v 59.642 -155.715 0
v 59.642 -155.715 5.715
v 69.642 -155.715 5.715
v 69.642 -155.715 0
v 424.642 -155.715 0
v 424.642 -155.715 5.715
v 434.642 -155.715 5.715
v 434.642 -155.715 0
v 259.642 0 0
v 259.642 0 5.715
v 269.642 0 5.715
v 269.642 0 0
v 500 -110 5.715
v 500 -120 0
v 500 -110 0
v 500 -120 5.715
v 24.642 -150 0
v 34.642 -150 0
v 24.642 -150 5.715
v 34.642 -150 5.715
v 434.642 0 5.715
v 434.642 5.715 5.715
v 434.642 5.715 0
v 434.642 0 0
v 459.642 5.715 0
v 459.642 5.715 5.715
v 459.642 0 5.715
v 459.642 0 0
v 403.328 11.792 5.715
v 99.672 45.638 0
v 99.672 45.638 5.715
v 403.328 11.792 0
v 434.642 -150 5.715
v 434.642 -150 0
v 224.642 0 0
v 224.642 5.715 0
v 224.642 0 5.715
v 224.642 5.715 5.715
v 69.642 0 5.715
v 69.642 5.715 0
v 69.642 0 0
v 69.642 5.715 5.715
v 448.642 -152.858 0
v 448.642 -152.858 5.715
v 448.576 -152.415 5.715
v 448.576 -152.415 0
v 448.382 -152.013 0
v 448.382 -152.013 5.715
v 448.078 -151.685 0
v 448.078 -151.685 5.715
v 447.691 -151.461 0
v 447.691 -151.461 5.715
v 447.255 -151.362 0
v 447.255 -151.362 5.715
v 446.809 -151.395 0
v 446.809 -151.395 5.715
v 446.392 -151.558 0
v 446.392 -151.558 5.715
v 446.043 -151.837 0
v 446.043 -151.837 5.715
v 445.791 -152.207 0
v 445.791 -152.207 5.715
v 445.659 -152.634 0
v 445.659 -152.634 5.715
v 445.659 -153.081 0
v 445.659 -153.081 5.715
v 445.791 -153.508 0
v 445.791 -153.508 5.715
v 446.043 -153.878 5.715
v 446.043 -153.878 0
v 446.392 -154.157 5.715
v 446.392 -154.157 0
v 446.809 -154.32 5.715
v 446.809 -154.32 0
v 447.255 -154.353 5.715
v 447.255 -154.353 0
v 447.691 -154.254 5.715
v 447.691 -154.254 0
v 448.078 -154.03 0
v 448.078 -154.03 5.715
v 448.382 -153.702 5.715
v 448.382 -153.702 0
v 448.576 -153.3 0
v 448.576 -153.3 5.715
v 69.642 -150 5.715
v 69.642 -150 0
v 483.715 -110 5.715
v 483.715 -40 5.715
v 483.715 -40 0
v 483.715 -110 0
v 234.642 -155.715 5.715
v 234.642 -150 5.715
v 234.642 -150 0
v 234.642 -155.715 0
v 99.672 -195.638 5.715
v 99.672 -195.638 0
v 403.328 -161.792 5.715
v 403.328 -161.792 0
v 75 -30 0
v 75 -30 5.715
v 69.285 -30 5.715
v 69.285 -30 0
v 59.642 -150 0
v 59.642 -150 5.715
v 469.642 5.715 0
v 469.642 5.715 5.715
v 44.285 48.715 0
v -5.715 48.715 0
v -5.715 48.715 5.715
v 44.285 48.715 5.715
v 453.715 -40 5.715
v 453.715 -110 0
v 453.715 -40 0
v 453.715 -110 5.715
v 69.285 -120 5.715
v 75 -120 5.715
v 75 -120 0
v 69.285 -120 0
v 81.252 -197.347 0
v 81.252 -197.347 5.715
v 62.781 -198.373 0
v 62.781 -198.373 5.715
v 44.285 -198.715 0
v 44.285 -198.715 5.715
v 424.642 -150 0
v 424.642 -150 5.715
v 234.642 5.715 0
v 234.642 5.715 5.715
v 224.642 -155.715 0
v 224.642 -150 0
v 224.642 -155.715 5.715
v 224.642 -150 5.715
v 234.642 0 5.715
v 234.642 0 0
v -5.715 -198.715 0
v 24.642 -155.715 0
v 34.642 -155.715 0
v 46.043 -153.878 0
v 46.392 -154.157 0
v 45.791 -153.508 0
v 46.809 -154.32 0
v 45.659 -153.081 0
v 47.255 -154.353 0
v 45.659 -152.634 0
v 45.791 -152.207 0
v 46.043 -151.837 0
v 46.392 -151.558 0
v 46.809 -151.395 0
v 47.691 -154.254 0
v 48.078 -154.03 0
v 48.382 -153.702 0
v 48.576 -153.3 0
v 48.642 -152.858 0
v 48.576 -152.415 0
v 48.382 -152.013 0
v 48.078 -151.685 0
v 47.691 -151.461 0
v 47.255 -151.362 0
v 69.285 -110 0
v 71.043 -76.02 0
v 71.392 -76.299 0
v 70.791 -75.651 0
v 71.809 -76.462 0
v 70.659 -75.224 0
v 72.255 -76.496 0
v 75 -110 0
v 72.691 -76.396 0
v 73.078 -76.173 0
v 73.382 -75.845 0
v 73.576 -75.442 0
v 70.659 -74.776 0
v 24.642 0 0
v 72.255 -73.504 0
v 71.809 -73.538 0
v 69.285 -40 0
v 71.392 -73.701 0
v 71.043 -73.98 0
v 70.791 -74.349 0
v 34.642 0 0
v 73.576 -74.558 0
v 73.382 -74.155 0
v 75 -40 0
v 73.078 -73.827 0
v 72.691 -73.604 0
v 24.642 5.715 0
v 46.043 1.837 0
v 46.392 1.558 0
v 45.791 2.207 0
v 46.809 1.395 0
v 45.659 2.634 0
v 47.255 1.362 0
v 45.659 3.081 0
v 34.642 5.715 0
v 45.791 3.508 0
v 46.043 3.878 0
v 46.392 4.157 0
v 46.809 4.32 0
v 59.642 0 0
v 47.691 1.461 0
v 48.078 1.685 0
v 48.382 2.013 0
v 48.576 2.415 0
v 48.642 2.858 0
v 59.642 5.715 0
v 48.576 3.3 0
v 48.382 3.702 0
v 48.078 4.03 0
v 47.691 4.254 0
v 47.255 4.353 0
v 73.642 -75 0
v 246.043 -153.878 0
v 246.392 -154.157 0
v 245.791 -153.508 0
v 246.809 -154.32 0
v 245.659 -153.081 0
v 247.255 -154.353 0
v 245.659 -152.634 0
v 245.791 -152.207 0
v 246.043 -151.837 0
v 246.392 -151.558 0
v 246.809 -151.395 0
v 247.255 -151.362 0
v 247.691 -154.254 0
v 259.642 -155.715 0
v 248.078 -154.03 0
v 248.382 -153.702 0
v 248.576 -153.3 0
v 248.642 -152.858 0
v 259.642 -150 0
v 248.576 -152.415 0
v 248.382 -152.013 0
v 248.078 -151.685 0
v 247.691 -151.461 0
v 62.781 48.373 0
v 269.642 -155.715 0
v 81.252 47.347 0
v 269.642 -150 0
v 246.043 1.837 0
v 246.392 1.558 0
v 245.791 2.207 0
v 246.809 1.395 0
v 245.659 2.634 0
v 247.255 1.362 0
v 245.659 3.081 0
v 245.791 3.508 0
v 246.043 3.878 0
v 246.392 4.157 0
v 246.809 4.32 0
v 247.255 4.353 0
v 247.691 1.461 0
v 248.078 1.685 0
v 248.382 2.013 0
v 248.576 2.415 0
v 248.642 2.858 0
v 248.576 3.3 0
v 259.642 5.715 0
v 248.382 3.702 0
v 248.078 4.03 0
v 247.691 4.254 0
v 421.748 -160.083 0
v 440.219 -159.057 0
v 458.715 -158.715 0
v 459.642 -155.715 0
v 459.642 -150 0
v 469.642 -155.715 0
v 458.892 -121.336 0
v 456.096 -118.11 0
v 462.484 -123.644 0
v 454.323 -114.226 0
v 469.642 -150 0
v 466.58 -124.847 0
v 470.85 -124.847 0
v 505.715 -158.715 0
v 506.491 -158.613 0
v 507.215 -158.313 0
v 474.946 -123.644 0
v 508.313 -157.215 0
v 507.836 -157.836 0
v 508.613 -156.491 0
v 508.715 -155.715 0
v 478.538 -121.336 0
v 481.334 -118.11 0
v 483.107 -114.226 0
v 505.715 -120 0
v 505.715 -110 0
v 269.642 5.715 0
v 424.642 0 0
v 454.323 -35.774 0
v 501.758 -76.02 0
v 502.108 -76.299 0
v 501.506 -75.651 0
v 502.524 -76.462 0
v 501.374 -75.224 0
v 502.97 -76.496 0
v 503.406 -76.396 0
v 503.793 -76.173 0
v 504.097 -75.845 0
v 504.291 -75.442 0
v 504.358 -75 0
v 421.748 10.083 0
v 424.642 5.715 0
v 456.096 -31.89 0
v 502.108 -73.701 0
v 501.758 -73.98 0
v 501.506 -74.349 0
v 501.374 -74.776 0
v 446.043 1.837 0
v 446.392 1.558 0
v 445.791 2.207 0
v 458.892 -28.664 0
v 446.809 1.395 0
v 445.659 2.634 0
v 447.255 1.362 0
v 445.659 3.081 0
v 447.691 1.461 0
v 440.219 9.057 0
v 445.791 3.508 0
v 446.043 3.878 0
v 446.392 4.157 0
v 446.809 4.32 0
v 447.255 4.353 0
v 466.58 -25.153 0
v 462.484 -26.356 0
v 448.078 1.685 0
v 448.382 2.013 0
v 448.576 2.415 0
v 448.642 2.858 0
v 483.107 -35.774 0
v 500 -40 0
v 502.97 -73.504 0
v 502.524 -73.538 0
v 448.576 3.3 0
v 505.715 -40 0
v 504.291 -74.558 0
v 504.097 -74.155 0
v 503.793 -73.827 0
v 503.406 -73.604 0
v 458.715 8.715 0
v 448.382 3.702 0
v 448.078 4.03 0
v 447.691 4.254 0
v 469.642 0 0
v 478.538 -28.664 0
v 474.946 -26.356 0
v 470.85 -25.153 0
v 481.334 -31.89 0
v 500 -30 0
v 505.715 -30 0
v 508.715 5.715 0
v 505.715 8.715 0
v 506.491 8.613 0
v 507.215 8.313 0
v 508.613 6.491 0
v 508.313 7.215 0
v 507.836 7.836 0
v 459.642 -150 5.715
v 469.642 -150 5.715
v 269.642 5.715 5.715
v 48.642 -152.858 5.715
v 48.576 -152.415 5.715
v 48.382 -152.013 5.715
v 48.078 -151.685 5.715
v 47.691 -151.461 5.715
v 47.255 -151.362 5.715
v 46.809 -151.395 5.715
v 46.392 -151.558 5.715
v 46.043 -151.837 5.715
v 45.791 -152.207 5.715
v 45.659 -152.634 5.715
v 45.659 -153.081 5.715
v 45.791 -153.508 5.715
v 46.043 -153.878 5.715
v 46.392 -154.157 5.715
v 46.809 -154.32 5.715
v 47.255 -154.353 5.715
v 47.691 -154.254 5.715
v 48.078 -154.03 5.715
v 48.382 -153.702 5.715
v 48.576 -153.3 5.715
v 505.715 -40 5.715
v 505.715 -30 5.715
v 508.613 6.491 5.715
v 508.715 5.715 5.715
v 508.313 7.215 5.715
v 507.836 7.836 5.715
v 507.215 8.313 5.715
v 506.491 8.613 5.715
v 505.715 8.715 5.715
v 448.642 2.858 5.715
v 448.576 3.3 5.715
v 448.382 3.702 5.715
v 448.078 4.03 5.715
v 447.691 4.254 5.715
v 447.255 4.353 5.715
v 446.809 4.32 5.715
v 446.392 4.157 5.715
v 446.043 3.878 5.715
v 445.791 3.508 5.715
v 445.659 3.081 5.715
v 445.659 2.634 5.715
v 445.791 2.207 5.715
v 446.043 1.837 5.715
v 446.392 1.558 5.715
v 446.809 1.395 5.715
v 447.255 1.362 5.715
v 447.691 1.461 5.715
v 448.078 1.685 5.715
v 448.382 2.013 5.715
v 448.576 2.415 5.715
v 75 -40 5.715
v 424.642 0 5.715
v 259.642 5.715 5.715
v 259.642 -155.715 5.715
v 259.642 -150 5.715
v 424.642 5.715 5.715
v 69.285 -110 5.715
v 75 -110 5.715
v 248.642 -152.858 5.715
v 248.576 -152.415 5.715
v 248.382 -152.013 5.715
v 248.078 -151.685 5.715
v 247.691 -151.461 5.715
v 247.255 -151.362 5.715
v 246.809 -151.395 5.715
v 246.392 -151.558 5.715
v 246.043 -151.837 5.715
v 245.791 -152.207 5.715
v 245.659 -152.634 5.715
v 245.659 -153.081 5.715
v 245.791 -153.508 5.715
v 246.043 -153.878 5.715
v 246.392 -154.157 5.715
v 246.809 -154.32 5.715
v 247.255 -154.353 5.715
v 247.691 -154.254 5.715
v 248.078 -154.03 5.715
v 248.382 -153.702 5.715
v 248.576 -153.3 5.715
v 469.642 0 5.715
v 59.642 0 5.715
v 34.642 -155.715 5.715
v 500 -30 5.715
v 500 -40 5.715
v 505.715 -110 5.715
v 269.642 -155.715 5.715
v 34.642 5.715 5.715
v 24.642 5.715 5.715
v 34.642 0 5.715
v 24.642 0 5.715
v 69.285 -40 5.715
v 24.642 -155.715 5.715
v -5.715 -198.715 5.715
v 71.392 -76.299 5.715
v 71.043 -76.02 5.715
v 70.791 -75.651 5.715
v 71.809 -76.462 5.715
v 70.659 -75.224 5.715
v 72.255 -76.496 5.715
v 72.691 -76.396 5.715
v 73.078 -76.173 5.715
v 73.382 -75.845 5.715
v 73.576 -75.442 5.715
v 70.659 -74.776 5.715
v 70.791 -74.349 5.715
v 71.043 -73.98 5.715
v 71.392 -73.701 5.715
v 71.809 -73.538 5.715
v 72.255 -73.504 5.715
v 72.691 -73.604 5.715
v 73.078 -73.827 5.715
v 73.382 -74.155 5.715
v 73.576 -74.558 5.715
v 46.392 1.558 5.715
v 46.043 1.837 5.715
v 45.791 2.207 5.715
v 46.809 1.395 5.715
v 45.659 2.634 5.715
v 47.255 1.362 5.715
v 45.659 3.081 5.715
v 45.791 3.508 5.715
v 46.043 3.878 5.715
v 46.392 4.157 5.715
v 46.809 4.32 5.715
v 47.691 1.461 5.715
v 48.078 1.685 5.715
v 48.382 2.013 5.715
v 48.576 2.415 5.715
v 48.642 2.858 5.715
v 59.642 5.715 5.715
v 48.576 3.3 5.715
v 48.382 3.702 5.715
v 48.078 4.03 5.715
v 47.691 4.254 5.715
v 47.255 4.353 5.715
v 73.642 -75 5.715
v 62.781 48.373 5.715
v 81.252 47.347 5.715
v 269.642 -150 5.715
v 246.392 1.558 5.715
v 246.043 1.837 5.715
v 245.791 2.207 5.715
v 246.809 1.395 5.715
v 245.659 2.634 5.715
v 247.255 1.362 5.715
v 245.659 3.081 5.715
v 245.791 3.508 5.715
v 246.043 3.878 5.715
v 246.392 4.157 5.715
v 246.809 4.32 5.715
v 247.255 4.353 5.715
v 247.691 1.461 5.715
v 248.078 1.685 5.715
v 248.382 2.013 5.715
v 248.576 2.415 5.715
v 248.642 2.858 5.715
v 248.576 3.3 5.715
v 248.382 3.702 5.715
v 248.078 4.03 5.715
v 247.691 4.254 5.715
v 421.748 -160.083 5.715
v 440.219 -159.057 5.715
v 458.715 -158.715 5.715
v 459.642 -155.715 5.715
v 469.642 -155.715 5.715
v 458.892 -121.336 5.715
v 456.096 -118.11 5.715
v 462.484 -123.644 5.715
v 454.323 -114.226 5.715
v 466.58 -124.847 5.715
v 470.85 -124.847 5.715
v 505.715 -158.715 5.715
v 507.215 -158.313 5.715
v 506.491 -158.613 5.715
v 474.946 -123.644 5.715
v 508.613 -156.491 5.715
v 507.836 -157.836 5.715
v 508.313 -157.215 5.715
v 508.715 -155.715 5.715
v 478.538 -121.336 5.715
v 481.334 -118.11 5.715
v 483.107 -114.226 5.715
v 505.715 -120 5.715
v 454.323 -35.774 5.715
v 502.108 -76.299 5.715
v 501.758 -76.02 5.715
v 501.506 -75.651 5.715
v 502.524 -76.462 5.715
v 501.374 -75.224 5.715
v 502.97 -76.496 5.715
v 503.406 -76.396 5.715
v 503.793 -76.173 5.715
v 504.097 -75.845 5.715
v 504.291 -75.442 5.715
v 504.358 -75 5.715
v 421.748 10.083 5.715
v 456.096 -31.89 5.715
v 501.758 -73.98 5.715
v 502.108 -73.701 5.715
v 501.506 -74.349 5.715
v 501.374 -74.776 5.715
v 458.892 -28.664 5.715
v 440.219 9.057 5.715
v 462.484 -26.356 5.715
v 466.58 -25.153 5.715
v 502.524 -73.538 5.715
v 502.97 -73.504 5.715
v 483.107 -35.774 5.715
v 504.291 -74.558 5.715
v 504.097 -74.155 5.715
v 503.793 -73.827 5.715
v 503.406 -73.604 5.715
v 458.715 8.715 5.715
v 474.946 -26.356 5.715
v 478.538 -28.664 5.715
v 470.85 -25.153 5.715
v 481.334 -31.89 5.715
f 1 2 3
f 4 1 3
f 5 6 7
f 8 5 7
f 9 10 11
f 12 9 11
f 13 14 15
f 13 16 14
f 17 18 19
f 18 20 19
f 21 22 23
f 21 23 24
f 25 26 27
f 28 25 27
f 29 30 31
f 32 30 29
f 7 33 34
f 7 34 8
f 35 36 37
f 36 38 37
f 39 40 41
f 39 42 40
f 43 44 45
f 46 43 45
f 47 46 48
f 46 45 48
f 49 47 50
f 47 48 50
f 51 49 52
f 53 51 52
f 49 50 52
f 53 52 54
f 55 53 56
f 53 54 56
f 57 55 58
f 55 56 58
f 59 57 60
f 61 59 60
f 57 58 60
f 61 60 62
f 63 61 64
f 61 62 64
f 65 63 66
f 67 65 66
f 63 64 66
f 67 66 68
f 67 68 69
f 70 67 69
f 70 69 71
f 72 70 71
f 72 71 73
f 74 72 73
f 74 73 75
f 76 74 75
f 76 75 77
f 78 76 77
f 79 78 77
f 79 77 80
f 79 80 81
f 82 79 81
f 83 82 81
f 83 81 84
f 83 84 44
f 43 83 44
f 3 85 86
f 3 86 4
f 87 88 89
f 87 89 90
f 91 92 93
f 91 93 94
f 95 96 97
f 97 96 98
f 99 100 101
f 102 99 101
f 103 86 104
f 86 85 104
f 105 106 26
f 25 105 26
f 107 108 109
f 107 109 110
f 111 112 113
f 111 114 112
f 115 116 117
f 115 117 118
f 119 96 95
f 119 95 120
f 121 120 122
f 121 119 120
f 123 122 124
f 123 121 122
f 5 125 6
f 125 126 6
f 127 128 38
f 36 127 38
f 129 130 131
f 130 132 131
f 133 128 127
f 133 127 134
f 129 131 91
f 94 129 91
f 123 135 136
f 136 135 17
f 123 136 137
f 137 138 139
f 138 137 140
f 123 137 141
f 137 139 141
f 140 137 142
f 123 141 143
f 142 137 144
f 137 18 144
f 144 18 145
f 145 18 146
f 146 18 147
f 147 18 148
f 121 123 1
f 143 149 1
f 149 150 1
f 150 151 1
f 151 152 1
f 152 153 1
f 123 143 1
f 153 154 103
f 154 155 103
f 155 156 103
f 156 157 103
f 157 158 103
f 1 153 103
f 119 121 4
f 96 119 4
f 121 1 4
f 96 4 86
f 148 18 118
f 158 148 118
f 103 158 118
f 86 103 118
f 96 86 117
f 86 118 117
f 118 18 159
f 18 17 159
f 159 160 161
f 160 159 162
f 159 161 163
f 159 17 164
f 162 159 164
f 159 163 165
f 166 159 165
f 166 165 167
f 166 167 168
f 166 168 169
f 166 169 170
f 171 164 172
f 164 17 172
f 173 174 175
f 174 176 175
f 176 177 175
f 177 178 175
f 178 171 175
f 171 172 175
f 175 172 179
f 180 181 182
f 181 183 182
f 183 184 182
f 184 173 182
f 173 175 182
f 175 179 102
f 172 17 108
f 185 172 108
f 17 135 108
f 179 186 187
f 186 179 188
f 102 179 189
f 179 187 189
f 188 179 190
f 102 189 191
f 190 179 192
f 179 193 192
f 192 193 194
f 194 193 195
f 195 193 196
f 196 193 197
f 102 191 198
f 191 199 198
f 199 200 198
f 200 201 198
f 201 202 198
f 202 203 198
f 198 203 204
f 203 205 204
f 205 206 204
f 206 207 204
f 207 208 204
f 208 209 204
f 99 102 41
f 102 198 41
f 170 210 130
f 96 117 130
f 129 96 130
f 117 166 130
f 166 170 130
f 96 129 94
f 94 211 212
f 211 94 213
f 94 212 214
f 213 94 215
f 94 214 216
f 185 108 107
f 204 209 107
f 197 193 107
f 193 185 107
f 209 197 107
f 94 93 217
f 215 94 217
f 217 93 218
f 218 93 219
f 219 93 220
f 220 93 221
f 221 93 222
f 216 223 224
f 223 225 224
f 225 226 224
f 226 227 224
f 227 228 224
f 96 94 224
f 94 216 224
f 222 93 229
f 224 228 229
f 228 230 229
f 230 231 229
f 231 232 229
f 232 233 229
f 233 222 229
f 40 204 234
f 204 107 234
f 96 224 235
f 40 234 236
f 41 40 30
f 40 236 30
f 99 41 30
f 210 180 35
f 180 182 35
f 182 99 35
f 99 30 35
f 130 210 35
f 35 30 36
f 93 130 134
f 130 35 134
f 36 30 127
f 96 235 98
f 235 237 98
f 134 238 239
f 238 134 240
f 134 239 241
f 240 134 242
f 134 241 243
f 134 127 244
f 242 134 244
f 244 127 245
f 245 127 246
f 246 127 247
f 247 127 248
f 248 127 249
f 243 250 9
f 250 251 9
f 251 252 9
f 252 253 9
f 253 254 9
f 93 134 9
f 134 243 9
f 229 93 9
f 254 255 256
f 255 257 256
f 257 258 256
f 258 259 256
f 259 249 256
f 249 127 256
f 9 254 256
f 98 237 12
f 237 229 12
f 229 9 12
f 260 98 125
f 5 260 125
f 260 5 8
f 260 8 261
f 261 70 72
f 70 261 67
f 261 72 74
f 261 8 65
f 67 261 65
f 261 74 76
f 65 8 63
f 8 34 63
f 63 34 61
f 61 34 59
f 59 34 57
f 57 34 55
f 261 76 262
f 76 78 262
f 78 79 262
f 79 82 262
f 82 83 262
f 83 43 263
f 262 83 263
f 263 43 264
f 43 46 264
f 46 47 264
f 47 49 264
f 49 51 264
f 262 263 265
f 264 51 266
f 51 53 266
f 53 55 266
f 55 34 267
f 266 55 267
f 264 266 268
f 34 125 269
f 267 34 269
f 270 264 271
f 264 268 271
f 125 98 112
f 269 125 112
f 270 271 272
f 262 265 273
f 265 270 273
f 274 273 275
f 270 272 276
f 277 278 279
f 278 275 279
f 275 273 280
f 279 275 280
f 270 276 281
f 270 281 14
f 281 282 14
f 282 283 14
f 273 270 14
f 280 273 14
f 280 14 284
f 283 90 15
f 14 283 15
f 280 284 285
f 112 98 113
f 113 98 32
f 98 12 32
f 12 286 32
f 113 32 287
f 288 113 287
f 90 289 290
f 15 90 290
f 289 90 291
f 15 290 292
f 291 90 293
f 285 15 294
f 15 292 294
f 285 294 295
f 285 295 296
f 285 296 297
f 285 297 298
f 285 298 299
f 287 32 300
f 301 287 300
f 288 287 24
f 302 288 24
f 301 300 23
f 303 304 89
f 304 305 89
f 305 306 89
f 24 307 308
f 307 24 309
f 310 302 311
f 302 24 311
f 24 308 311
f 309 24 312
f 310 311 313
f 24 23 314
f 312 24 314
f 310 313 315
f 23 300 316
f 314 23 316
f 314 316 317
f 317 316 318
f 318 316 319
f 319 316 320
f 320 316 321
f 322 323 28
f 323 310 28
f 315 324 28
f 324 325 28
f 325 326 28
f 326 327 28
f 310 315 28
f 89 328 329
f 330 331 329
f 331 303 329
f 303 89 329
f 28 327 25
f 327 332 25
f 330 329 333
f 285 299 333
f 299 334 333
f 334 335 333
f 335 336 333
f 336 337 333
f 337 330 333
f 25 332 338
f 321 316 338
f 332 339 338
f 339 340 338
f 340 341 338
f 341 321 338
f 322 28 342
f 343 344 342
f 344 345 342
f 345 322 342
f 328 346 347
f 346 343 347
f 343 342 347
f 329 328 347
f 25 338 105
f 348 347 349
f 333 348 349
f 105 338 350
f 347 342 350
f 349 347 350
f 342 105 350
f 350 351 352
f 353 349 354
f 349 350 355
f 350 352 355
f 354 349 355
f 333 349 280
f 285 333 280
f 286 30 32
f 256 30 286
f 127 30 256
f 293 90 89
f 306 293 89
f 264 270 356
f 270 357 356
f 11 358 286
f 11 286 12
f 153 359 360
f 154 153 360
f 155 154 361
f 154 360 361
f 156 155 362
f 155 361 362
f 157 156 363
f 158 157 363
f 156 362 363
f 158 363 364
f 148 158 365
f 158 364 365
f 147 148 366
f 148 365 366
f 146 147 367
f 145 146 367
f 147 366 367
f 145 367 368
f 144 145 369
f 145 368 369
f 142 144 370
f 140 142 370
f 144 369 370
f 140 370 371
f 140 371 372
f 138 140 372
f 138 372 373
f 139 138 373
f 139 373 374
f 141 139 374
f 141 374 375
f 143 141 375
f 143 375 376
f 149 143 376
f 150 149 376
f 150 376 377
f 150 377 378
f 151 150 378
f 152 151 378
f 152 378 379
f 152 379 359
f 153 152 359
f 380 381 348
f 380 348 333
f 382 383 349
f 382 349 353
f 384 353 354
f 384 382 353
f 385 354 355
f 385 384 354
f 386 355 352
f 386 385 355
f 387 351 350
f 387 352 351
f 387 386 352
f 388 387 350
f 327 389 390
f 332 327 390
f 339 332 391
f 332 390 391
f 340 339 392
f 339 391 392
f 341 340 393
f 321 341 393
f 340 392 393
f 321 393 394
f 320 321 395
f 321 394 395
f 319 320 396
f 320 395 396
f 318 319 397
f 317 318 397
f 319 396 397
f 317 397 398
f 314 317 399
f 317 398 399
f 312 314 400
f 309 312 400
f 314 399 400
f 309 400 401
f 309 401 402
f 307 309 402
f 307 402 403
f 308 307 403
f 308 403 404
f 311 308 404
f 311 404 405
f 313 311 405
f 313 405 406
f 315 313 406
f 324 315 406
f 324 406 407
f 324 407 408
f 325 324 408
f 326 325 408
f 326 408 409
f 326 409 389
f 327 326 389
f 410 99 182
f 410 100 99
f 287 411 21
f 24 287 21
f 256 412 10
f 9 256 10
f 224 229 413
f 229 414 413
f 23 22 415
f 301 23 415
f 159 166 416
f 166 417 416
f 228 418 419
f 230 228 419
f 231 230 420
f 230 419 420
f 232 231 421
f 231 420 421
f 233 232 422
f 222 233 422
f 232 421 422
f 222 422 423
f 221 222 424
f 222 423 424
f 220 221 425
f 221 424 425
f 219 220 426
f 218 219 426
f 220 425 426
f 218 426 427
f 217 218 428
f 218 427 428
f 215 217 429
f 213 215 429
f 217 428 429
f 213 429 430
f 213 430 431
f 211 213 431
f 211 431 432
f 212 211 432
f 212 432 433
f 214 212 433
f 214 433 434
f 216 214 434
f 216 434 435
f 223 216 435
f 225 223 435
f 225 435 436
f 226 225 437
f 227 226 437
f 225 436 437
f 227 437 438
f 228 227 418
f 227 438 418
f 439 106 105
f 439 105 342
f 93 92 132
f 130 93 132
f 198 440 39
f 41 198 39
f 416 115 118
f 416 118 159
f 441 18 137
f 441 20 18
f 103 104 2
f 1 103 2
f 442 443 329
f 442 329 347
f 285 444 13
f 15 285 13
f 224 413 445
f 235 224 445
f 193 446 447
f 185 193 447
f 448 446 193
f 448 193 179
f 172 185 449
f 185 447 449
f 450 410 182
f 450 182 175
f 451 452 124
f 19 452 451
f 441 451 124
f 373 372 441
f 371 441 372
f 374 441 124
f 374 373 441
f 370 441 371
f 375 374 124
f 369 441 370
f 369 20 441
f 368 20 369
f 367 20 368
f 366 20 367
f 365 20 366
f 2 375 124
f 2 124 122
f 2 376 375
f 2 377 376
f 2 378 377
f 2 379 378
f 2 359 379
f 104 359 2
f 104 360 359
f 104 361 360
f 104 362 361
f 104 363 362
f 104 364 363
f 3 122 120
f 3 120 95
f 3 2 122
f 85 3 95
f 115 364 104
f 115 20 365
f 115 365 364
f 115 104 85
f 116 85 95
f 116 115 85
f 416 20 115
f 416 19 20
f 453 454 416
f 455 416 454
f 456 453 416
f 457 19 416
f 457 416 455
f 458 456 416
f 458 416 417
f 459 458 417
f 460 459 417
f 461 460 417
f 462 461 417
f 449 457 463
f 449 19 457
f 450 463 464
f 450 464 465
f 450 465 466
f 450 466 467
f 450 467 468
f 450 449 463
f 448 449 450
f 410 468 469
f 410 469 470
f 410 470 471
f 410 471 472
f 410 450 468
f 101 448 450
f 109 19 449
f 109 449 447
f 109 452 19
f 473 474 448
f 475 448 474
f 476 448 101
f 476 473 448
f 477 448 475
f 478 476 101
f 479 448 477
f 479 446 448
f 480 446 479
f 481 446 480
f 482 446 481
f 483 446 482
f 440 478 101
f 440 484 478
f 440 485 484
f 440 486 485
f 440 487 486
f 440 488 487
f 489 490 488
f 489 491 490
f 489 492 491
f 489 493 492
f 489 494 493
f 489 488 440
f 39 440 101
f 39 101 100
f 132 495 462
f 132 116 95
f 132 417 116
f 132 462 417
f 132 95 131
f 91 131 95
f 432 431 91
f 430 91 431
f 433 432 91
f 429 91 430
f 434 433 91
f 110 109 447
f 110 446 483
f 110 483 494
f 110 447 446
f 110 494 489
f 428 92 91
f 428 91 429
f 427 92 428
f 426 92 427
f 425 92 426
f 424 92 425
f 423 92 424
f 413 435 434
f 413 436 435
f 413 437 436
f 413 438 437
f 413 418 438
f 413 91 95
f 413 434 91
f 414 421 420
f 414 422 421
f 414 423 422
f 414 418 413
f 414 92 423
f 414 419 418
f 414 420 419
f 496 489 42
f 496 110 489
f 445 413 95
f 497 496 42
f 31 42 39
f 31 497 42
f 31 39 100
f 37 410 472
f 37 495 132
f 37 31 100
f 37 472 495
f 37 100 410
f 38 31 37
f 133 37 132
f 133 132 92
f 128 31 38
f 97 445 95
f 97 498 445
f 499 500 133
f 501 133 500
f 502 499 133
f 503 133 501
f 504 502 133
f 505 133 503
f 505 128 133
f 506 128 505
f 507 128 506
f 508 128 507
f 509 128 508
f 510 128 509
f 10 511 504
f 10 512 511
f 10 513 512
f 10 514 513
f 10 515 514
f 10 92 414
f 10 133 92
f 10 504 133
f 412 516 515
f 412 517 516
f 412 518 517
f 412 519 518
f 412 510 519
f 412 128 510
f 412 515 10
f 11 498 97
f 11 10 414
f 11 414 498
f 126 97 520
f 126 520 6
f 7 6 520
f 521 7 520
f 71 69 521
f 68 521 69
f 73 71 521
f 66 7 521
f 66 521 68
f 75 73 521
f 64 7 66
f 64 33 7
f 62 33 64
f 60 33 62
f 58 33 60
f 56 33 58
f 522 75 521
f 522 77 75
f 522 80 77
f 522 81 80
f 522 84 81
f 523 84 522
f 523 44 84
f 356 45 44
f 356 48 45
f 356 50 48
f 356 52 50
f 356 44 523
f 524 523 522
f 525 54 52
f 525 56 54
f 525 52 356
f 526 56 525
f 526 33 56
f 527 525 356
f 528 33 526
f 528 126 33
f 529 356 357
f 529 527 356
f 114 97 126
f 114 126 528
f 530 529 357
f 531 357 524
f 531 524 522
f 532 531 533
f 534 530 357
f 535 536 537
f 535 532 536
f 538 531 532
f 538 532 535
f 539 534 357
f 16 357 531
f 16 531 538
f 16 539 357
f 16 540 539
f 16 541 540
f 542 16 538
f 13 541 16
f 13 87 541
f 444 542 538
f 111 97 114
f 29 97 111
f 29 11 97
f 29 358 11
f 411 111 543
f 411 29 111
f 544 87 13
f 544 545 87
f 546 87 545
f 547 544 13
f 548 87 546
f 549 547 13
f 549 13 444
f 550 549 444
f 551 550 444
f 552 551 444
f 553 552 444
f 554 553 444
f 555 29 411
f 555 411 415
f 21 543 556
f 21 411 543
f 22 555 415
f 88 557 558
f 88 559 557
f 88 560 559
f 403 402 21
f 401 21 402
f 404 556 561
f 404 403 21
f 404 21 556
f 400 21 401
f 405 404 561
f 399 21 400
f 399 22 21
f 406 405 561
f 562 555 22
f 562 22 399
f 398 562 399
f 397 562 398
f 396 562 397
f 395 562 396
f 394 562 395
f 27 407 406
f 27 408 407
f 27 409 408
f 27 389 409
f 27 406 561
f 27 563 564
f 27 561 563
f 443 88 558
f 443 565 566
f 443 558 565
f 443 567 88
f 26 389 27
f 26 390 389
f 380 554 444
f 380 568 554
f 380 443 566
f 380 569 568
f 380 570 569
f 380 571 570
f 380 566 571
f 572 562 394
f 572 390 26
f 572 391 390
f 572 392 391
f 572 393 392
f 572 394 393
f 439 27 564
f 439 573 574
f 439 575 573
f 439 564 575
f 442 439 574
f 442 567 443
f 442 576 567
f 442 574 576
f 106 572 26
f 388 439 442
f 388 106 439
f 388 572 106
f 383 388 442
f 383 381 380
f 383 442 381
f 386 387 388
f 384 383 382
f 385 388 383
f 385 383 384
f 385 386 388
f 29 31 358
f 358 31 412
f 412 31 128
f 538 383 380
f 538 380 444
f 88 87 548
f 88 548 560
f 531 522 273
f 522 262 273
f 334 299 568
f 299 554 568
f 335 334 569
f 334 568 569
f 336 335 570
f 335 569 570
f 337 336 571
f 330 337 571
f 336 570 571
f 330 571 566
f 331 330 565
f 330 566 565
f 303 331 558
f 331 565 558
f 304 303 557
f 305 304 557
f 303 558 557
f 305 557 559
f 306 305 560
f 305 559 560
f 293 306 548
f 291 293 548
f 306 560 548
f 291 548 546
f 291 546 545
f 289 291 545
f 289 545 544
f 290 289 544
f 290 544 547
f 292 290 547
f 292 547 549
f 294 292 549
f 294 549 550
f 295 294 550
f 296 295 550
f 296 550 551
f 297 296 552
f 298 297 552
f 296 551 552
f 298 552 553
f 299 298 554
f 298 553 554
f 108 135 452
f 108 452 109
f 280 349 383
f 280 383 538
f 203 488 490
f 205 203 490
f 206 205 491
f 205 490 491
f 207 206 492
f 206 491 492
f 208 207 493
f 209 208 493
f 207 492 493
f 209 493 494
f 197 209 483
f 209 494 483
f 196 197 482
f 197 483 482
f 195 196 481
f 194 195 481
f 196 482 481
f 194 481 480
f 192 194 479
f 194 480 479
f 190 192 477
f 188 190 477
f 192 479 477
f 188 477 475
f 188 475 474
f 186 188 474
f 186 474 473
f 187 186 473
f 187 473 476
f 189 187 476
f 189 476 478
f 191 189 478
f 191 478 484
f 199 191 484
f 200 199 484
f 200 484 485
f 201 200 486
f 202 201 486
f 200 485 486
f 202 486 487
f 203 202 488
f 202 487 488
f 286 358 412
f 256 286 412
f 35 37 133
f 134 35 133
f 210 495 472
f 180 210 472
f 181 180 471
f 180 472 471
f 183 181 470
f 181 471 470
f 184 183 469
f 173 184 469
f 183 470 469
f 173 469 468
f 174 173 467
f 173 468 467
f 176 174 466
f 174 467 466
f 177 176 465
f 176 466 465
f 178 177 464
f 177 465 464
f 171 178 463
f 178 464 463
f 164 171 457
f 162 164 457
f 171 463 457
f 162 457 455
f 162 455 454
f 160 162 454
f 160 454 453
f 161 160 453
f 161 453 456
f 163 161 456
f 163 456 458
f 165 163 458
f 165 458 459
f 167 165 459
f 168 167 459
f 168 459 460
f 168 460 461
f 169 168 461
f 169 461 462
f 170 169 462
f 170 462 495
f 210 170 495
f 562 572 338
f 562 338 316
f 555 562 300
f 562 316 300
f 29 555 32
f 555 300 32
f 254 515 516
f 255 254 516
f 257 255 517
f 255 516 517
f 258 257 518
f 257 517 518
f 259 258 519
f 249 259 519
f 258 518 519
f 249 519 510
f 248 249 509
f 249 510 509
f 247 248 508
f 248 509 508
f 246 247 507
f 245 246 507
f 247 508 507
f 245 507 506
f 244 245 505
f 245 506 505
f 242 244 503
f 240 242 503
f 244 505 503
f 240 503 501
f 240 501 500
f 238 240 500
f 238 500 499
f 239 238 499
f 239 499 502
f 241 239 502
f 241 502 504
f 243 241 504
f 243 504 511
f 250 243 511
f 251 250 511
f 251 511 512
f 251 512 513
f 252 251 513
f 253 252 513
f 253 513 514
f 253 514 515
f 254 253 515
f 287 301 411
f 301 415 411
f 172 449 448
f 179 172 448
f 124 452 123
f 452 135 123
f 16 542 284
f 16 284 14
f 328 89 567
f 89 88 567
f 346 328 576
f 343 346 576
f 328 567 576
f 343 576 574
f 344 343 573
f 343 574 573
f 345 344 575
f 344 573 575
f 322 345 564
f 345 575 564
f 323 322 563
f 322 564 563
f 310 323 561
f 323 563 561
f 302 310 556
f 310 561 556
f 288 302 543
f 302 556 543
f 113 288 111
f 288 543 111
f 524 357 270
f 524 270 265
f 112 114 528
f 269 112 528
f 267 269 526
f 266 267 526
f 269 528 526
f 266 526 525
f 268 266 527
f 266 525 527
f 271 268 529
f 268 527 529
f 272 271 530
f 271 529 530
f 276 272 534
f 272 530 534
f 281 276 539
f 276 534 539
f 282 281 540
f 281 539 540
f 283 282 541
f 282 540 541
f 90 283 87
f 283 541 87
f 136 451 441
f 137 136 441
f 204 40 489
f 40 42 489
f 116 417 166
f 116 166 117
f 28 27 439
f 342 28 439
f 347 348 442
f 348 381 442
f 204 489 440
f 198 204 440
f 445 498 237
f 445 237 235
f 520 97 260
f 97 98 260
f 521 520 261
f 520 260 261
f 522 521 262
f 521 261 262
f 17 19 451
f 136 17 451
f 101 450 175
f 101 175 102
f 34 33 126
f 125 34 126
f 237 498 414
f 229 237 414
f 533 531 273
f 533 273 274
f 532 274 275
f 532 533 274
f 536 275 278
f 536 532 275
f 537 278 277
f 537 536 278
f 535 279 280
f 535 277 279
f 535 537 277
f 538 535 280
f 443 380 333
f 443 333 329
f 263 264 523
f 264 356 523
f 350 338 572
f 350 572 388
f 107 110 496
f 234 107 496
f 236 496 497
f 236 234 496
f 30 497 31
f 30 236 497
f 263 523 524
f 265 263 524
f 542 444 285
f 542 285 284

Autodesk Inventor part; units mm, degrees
ref_plane "YZ Plane" through (0, 0, 0) normal (1, 0, 0) x (0, 1, 0)
ref_plane "XZ Plane" through (0, 0, 0) normal (0, 1, 0) x (-1, 0, 0)
ref_plane "XY Plane" through (0, 0, 0) normal (0, 0, 1) x (1, 0, 0)
sketch "Sketch1" plane through (0, 0, 0) normal (0, 0, 1) x (1, 0, 0)
  line L0 (508.715, -158.715) -> (-5.715, -158.715) construction
  line L1 (-5.715, -158.715) -> (-5.715, 8.715)
  line L2 (-5.715, 8.715) -> (508.715, 8.715) construction
  line L3 (508.715, 8.715) -> (508.715, -158.715)
  line L4 (-5.715, 8.715) -> (-5.715, 48.715)
  line L5 (-5.715, 48.715) -> (44.285, 48.715)
  arc A0 (99.6722, 45.6378) -> (44.285, 48.715) centre (44.285, -451.285) ccw
  line L6 (99.6722, 45.6378) -> (403.3278, 11.7922)
  arc A1 (403.3278, 11.7922) -> (458.715, 8.715) centre (458.715, 508.715) ccw
  line L7 (458.715, 8.715) -> (508.715, 8.715)
  line L8 (-5.715, -158.715) -> (-5.715, -198.715)
  line L9 (-5.715, -198.715) -> (44.285, -198.715)
  arc A2 (44.285, -198.715) -> (99.6722, -195.6378) centre (44.285, 301.285) ccw
  line L10 (99.6722, -195.6378) -> (403.3278, -161.7922)
  arc A3 (458.715, -158.715) -> (403.3278, -161.7922) centre (458.715, -658.715) ccw
  line L11 (458.715, -158.715) -> (508.715, -158.715)
  point P0 (0, 0)
  point P1 (0, 5.715)
  point P2 (505.715, -158.715)
  point P3 (505.715, 8.715)
  point P4 (-5.715, 5.715)
  dimension "d0" = 3
  dimension "d2" = 500
  dimension "d3" = 50
  dimension "d4" = 40
extrude "Extrusion1" add sketch "Sketch1" along normal blind 5.715
fillet "Fillet1" radius 3 2 edges at (508.715, 8.715, 2.8575) (508.715, -158.715, 2.8575)
sketch "Sketch2" plane through (0, 0, 5.715) normal (0, 0, 1) x (1, 0, 0)
  line L0 (24.6425, 0) -> (34.6425, 0) projected
  line L1 (34.6425, 5.715) -> (34.6425, 0) projected
  line L2 (34.6425, 5.715) -> (24.6425, 5.715) projected
  line L3 (24.6425, 5.715) -> (24.6425, 0) projected
  line L4 (59.6425, 0) -> (69.6425, 0) projected
  line L5 (69.6425, 5.715) -> (69.6425, 0) projected
  line L6 (69.6425, 5.715) -> (59.6425, 5.715) projected
  line L7 (59.6425, 5.715) -> (59.6425, 0) projected
  line L8 (224.6425, 0) -> (234.6425, 0) projected
  line L9 (234.6425, 5.715) -> (234.6425, 0) projected
  line L10 (234.6425, 5.715) -> (224.6425, 5.715) projected
  line L11 (224.6425, 5.715) -> (224.6425, 0) projected
  line L12 (259.6425, 0) -> (269.6425, 0) projected
  line L13 (269.6425, 5.715) -> (269.6425, 0) projected
  line L14 (269.6425, 5.715) -> (259.6425, 5.715) projected
  line L15 (259.6425, 5.715) -> (259.6425, 0) projected
  line L16 (424.6425, 0) -> (434.6425, 0) projected
  line L17 (434.6425, 5.715) -> (434.6425, 0) projected
  line L18 (434.6425, 5.715) -> (424.6425, 5.715) projected
  line L19 (424.6425, 5.715) -> (424.6425, 0) projected
  line L20 (459.6425, 0) -> (469.6425, 0) projected
  line L21 (469.6425, 5.715) -> (469.6425, 0) projected
  line L22 (469.6425, 5.715) -> (459.6425, 5.715) projected
  line L23 (459.6425, 5.715) -> (459.6425, 0) projected
  line L24 (500, -40) -> (500, -30) projected
  line L25 (505.715, -40) -> (500, -40) projected
  line L26 (505.715, -30) -> (505.715, -40) projected
  line L27 (505.715, -30) -> (500, -30) projected
  line L28 (500, -120) -> (500, -110) projected
  line L29 (505.715, -120) -> (500, -120) projected
  line L30 (505.715, -110) -> (505.715, -120) projected
  line L31 (505.715, -110) -> (500, -110) projected
  line L32 (459.6425, -155.715) -> (469.6425, -155.715) projected
  line L33 (469.6425, -150) -> (469.6425, -155.715) projected
  line L34 (469.6425, -150) -> (459.6425, -150) projected
  line L35 (459.6425, -150) -> (459.6425, -155.715) projected
  line L36 (424.6425, -155.715) -> (434.6425, -155.715) projected
  line L37 (434.6425, -150) -> (434.6425, -155.715) projected
  line L38 (434.6425, -150) -> (424.6425, -150) projected
  line L39 (424.6425, -150) -> (424.6425, -155.715) projected
  line L40 (259.6425, -155.715) -> (269.6425, -155.715) projected
  line L41 (269.6425, -150) -> (269.6425, -155.715) projected
  line L42 (269.6425, -150) -> (259.6425, -150) projected
  line L43 (259.6425, -150) -> (259.6425, -155.715) projected
  line L44 (224.6425, -155.715) -> (234.6425, -155.715) projected
  line L45 (234.6425, -150) -> (234.6425, -155.715) projected
  line L46 (234.6425, -150) -> (224.6425, -150) projected
  line L47 (224.6425, -150) -> (224.6425, -155.715) projected
  line L48 (59.6425, -155.715) -> (69.6425, -155.715) projected
  line L49 (69.6425, -150) -> (69.6425, -155.715) projected
  line L50 (69.6425, -150) -> (59.6425, -150) projected
  line L51 (59.6425, -150) -> (59.6425, -155.715) projected
  line L52 (24.6425, -155.715) -> (34.6425, -155.715) projected
  line L53 (34.6425, -150) -> (34.6425, -155.715) projected
  line L54 (34.6425, -150) -> (24.6425, -150) projected
  line L55 (24.6425, -150) -> (24.6425, -155.715) projected
  line L56 (34.6425, 2.8575) -> (59.6425, 2.8575) construction
  circle A0 centre (47.1425, 2.8575) radius 1.5
  line L57 (234.6425, 2.8575) -> (259.6425, 2.8575) construction
  circle A1 centre (247.1425, 2.8575) radius 1.5
  line L58 (434.6425, 2.8575) -> (459.6425, 2.8575) construction
  circle A2 centre (447.1425, 2.8575) radius 1.5
  line L59 (502.8575, -40) -> (502.8575, -110) construction
  circle A3 centre (502.8575, -75) radius 1.5
  line L60 (434.6425, -152.8575) -> (459.6425, -152.8575) construction
  circle A4 centre (447.1425, -152.8575) radius 1.5
  line L61 (234.6425, -152.8575) -> (259.6425, -152.8575) construction
  circle A5 centre (247.1425, -152.8575) radius 1.5
  line L62 (34.6425, -152.8575) -> (59.6425, -152.8575) construction
  circle A6 centre (47.1425, -152.8575) radius 1.5
  point P0 (0, 0)
  dimension "d8" = 3
  dimension "d10" = 3
  dimension "d11" = 3
  dimension "d12" = 3
  dimension "d13" = 3
  dimension "d14" = 3
  dimension "d15" = 3
extrude "Extrusion2" cut sketch "Sketch2" against normal through all
sketch "Sketch3" plane through (0, 0, 5.715) normal (0, 0, 1) x (1, 0, 0)
  line L0 (75, -30) -> (75, -40) projected
  line L1 (75, -30) -> (69.285, -30) projected
  line L2 (69.285, -40) -> (69.285, -30) projected
  line L3 (75, -40) -> (69.285, -40) projected
  line L4 (75, -110) -> (75, -120) projected
  line L5 (75, -110) -> (69.285, -110) projected
  line L6 (69.285, -120) -> (69.285, -110) projected
  line L7 (75, -120) -> (69.285, -120) projected
  line L8 (72.1425, -40) -> (72.1425, -110)
  circle A0 centre (72.1425, -75) radius 1.5
  point P0 (0, 0)
  dimension "d18" = 3
extrude "Extrusion3" cut sketch "Sketch3" against normal through all
sketch "Sketch4" plane through (0, 0, 5.715) normal (0, 0, 1) x (1, 0, 0)
  circle A0 centre (502.8575, -75) radius 1.5 projected
  line L0 (508.715, -155.715) -> (508.715, 5.715) projected
  line L1 (458.715, -158.715) -> (505.715, -158.715) projected
  line L2 (453.715, -110) -> (453.715, -40)
  arc A1 (483.715, -40) -> (453.715, -40) centre (468.715, -40) ccw
  line L3 (483.715, -40) -> (483.715, -110)
  arc A2 (453.715, -110) -> (483.715, -110) centre (468.715, -110) ccw
  point P0 (0, 0)
  point P1 (483.715, -75)
  dimension "d22" = 70
  dimension "d25" = 15
  dimension "d26" = 25
extrude "Extrusion4" cut sketch "Sketch4" against normal through all contours L2 A1 L3 A2
properties part number "SIDE PLATE"
